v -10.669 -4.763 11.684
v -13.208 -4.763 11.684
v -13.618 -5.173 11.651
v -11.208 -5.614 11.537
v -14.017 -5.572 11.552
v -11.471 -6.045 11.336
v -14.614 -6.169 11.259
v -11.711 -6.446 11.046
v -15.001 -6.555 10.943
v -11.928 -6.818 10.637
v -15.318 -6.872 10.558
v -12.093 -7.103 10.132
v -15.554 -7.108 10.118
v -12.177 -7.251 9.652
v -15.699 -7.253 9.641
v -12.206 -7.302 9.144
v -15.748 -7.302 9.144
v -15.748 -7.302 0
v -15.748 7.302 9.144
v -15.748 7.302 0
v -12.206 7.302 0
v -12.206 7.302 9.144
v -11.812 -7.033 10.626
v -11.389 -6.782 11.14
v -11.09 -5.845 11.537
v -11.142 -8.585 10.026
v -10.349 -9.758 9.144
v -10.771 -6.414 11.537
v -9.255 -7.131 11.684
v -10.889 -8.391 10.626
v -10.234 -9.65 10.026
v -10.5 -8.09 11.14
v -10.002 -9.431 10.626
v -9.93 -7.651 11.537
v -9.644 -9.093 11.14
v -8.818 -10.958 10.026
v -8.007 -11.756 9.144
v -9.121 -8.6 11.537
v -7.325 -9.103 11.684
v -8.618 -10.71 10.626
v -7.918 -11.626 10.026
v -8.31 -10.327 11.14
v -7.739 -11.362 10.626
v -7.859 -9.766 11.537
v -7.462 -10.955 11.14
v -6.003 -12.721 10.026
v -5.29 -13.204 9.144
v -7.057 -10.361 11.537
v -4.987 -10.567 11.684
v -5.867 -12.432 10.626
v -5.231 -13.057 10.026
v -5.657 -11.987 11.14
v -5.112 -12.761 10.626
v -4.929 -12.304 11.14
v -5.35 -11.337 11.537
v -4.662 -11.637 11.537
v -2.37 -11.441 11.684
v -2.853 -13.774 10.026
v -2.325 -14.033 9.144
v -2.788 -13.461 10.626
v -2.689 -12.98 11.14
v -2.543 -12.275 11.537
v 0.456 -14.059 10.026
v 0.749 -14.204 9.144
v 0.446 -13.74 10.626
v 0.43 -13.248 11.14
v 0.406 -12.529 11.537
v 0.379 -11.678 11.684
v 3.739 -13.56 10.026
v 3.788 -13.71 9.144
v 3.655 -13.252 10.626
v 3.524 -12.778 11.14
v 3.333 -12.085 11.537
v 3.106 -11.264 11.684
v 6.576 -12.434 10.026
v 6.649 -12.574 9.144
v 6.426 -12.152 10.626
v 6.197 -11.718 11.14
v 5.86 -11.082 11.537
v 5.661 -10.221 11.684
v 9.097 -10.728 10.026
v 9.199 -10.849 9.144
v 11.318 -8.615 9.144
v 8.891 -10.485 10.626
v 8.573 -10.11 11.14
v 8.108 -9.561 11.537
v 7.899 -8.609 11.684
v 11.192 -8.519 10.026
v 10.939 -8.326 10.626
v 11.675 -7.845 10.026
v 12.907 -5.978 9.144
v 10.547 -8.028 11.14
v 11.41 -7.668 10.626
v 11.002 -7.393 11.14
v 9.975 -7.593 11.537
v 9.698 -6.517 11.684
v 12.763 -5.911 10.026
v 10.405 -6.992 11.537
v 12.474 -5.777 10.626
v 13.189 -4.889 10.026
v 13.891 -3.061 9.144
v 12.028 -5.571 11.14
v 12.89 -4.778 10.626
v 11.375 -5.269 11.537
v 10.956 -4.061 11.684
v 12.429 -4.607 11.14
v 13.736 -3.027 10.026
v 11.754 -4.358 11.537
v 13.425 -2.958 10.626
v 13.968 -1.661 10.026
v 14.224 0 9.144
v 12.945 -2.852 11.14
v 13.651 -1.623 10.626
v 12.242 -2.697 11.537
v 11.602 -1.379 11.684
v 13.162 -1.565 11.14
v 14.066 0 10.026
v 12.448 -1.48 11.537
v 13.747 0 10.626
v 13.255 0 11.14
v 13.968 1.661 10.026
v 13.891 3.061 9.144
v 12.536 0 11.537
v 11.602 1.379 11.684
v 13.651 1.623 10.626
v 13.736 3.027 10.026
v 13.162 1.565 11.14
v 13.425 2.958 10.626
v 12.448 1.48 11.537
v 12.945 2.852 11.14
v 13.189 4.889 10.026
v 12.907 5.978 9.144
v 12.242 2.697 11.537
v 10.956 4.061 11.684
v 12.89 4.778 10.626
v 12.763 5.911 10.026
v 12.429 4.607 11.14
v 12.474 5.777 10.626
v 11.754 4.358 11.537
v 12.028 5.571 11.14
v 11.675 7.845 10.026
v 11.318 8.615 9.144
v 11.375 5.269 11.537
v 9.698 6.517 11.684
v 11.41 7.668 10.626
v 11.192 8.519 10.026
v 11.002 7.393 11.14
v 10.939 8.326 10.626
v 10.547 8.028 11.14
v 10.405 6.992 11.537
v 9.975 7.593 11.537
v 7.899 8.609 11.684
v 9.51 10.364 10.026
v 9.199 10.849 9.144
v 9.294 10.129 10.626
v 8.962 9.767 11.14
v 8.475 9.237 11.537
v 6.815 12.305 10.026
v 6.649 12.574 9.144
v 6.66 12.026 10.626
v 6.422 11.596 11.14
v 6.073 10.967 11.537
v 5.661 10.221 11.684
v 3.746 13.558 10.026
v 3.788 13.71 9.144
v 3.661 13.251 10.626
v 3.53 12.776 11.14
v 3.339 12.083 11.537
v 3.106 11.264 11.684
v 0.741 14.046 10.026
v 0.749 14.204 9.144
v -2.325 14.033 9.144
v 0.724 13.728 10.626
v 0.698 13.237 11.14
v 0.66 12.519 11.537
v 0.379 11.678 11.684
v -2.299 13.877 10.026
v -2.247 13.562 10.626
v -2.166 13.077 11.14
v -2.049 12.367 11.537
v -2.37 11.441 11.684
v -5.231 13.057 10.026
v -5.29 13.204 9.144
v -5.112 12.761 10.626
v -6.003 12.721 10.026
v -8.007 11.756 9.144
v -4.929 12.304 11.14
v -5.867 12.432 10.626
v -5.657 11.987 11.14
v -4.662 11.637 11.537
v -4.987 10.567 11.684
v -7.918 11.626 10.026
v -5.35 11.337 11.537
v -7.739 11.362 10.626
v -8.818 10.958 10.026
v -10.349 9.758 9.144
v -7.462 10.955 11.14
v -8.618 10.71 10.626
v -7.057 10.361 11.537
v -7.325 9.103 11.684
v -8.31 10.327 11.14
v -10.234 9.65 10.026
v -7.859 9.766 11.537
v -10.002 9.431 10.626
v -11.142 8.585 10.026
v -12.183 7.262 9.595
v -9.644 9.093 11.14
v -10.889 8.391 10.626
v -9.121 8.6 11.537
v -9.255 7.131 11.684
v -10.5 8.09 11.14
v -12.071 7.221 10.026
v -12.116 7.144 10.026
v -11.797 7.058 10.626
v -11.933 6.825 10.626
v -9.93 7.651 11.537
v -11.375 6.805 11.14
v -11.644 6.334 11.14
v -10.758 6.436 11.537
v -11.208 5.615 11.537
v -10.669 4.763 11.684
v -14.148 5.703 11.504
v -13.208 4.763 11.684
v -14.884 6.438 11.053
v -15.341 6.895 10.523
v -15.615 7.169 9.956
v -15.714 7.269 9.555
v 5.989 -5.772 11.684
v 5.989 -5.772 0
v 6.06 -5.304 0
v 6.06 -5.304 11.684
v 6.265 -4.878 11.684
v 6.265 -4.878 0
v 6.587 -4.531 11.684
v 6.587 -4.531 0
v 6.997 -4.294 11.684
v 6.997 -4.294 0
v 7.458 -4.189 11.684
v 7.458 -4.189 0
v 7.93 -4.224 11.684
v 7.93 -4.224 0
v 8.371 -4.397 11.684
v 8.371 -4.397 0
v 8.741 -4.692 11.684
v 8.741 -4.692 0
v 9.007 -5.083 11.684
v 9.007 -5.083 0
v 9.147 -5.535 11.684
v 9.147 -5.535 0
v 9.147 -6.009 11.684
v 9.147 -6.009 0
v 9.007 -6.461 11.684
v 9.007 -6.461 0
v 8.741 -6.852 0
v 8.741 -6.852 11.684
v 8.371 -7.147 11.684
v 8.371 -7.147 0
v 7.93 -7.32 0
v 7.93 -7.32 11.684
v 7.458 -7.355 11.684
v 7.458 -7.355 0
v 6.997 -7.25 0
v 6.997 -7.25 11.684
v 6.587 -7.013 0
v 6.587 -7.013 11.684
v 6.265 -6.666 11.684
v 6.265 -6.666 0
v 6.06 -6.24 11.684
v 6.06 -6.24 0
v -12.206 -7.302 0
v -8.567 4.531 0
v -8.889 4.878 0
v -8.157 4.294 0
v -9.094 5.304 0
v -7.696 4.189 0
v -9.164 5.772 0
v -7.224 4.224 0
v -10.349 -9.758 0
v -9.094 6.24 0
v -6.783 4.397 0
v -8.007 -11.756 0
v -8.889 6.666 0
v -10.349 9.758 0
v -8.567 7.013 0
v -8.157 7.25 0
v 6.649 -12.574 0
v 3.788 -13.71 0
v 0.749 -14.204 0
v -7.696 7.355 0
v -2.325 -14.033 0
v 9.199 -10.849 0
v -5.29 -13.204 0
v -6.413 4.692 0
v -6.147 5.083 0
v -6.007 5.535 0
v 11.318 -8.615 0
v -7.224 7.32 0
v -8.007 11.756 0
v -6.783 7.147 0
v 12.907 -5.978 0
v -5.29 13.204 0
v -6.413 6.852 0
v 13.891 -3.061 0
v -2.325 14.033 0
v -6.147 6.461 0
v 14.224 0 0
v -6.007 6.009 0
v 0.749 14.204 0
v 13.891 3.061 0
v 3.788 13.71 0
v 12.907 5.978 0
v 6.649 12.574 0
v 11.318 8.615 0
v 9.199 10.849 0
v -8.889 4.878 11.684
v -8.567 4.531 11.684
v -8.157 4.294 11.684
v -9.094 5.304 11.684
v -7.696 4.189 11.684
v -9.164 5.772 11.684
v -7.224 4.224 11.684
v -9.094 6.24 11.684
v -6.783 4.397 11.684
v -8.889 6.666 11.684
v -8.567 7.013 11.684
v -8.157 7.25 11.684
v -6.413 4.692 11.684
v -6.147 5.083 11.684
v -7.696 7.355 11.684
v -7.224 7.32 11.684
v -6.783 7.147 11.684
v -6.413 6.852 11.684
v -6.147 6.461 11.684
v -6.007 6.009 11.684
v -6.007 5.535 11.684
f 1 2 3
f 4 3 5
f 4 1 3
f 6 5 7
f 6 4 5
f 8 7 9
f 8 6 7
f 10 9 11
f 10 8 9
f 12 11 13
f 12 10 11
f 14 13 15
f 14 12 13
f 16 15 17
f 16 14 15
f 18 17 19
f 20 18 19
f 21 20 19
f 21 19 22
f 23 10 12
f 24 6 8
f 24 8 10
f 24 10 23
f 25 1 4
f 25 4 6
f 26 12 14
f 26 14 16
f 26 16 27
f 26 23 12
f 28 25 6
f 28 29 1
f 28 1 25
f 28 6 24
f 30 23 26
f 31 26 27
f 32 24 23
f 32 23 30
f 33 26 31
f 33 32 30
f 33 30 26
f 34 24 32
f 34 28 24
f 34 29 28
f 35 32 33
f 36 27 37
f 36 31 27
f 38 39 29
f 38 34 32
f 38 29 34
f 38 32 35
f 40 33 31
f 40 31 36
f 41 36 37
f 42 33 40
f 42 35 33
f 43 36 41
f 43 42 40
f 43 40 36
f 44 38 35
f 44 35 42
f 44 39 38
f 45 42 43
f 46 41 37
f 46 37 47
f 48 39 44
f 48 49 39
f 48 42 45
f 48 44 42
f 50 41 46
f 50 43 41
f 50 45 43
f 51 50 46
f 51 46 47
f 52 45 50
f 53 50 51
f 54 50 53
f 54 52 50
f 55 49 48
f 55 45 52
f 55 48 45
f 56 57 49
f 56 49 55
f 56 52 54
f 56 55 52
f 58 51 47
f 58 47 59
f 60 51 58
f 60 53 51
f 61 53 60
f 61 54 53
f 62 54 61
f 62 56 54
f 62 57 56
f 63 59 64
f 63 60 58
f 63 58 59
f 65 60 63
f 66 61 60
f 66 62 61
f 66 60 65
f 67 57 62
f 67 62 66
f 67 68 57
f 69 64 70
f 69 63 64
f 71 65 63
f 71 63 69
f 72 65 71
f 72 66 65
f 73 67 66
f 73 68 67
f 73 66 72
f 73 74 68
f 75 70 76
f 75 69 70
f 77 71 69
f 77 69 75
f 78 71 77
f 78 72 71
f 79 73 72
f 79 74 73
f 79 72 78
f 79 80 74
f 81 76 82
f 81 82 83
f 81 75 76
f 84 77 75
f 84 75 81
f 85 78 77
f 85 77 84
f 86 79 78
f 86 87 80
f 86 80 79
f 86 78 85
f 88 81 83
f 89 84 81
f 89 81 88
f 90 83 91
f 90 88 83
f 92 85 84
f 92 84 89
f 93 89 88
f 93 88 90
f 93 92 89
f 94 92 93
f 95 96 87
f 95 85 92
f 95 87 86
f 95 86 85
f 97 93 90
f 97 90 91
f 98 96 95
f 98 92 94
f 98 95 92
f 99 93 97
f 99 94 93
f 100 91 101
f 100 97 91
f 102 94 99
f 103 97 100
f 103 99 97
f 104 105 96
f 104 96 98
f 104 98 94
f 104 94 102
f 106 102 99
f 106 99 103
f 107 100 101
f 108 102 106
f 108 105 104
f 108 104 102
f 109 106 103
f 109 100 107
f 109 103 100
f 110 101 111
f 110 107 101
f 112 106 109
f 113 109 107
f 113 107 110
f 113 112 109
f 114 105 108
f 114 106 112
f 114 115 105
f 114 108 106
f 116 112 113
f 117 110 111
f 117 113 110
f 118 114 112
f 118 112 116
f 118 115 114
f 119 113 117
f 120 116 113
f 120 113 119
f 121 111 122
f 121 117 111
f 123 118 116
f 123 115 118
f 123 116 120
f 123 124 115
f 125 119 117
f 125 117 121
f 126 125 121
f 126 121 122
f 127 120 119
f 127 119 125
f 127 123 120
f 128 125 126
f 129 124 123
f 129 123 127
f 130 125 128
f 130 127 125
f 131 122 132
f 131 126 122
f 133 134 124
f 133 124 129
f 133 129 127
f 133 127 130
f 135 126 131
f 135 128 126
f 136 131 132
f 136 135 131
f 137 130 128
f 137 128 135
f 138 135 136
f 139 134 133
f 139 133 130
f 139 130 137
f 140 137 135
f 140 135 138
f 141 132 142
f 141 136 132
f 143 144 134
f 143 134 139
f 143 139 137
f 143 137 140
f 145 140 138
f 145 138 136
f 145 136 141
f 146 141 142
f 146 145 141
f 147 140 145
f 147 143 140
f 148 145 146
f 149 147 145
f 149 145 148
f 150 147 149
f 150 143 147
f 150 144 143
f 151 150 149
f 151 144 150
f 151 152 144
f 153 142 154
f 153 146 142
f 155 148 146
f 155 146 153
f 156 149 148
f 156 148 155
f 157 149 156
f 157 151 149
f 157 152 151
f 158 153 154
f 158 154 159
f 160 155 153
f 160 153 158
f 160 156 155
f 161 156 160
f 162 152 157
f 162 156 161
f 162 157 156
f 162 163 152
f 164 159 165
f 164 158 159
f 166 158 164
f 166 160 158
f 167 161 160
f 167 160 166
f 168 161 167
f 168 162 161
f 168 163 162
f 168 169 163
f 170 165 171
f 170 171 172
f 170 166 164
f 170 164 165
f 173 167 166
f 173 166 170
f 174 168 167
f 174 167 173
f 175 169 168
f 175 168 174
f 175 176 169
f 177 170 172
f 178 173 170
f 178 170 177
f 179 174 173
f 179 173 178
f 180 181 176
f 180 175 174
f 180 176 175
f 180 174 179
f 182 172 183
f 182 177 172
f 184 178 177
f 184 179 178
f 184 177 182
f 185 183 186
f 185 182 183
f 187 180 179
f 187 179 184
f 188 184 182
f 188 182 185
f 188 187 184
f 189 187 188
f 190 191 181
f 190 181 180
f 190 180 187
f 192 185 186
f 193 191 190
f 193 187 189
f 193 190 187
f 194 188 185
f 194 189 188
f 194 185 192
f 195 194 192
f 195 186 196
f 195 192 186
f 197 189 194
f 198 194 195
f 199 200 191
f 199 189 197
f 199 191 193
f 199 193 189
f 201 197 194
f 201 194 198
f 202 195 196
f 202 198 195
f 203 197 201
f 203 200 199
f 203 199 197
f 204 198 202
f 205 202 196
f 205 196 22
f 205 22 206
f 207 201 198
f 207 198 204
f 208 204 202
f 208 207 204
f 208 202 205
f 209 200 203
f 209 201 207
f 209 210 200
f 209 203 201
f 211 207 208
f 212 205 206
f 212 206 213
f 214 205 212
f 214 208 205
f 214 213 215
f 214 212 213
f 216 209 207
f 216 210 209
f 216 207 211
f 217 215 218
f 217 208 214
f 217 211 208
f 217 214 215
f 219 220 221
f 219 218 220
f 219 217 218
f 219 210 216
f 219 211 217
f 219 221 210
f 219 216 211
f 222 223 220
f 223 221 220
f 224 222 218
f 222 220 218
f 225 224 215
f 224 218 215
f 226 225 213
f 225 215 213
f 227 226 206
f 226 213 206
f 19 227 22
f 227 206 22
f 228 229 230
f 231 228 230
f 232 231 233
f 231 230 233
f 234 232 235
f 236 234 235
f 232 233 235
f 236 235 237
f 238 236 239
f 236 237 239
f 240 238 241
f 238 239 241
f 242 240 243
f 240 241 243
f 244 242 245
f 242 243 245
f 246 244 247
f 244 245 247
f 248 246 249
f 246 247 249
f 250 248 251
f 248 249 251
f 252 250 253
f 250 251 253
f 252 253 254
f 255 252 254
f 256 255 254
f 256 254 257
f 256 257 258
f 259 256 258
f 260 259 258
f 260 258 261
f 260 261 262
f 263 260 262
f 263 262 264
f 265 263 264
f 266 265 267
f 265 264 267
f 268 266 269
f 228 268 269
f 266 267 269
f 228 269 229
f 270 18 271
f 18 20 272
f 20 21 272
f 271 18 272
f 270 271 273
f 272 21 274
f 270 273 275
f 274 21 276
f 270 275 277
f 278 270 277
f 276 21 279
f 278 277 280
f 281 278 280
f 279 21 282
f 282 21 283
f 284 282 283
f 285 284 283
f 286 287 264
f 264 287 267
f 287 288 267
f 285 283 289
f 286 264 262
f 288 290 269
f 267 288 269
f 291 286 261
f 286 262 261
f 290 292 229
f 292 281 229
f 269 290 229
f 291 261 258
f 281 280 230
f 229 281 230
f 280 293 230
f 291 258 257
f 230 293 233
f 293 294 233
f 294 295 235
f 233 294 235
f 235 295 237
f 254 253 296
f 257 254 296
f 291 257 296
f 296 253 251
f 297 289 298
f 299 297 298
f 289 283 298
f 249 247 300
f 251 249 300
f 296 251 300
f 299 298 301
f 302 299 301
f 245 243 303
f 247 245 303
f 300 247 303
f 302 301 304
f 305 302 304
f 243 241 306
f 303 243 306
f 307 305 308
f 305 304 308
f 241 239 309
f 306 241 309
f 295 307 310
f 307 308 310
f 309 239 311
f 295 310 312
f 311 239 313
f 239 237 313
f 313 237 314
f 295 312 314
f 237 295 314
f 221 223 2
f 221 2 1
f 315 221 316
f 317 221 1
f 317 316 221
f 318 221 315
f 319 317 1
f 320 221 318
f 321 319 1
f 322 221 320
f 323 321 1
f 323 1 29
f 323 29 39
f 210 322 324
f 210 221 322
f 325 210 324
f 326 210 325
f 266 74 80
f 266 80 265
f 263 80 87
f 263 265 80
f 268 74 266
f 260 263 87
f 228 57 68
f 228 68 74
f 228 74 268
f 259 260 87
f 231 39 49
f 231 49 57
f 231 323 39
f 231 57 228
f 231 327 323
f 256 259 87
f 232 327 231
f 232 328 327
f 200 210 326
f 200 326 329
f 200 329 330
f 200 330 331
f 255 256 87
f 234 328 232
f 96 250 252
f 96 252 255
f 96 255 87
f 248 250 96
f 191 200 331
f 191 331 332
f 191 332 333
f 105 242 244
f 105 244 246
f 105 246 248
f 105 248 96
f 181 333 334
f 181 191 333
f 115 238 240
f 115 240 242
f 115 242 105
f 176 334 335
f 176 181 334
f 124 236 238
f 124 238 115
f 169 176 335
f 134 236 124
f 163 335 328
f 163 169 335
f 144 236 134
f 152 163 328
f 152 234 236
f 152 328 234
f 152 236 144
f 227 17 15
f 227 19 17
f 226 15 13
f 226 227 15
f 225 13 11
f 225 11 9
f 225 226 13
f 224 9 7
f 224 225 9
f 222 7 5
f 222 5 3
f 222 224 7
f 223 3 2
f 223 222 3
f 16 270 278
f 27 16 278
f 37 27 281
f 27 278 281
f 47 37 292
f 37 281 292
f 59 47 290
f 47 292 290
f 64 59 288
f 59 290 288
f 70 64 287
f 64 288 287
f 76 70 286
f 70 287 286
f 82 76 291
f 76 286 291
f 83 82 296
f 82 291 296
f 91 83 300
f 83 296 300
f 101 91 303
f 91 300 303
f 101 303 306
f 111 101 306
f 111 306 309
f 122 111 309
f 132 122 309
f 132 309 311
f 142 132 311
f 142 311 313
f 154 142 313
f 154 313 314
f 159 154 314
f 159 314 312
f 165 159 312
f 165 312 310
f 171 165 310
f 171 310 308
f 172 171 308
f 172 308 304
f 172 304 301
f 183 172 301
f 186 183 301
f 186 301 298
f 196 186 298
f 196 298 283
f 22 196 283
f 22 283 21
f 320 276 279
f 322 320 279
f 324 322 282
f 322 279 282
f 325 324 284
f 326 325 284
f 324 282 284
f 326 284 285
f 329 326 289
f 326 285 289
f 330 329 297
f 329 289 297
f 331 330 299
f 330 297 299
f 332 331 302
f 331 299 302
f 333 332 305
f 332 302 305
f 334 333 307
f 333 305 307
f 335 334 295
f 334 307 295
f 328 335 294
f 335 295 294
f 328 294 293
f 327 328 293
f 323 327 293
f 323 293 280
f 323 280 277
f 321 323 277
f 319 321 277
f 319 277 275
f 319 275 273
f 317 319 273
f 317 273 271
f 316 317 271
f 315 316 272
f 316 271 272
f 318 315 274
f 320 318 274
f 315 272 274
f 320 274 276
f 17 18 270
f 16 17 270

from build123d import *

# Parameters (mm, degrees)
SKETCH1_R           = 14.224
BOSS_EXTRUDE1_DEPTH = 11.684
SKETCH2_W           = 10.862447087
SKETCH2_H           = 14.605
BOSS_EXTRUDE2_DEPTH = 11.684
FILLET1_R           = 2.54
SKETCH3_R           = 1.5875
CUT_EXTRUDE1_DEPTH  = 11.684


with BuildPart() as part:
    # Sketch1 → Boss-Extrude1 (new body)
    with BuildSketch(Plane.XY):
        Circle(SKETCH1_R)
    extrude(amount=BOSS_EXTRUDE1_DEPTH)

    # Sketch2 → Boss-Extrude2 (add)
    with BuildSketch(Plane.XY.offset(11.684)):
        with Locations((-10.316776457, 0)):
            Rectangle(SKETCH2_W, SKETCH2_H)
    extrude(amount=-BOSS_EXTRUDE2_DEPTH)

    # Fillet1
    fillet1_edges = [part.edges().sort_by_distance(p)[0] for p in [
        (-13.97718912, 7.3025, 11.684),
        (-15.748, 0, 11.684),
        (-13.97718912, -7.3025, 11.684),
        (14.224, 0, 11.684),
    ]]
    fillet(fillet1_edges, radius=FILLET1_R - 0.0001)  # a hair under: the kernel refuses the full size

    # Sketch3 → Cut-Extrude1 (cut)
    with BuildSketch(Plane(origin=(0, 0, 0), x_dir=(-1, 0, 0), z_dir=(0, 0, -1))):
        with Locations((7.576884905, 5.772039513)):
            Circle(SKETCH3_R)
        with Locations((-7.576884905, -5.772039513)):
            Circle(SKETCH3_R)
    extrude(amount=-CUT_EXTRUDE1_DEPTH, mode=Mode.SUBTRACT)


solid = part.part
